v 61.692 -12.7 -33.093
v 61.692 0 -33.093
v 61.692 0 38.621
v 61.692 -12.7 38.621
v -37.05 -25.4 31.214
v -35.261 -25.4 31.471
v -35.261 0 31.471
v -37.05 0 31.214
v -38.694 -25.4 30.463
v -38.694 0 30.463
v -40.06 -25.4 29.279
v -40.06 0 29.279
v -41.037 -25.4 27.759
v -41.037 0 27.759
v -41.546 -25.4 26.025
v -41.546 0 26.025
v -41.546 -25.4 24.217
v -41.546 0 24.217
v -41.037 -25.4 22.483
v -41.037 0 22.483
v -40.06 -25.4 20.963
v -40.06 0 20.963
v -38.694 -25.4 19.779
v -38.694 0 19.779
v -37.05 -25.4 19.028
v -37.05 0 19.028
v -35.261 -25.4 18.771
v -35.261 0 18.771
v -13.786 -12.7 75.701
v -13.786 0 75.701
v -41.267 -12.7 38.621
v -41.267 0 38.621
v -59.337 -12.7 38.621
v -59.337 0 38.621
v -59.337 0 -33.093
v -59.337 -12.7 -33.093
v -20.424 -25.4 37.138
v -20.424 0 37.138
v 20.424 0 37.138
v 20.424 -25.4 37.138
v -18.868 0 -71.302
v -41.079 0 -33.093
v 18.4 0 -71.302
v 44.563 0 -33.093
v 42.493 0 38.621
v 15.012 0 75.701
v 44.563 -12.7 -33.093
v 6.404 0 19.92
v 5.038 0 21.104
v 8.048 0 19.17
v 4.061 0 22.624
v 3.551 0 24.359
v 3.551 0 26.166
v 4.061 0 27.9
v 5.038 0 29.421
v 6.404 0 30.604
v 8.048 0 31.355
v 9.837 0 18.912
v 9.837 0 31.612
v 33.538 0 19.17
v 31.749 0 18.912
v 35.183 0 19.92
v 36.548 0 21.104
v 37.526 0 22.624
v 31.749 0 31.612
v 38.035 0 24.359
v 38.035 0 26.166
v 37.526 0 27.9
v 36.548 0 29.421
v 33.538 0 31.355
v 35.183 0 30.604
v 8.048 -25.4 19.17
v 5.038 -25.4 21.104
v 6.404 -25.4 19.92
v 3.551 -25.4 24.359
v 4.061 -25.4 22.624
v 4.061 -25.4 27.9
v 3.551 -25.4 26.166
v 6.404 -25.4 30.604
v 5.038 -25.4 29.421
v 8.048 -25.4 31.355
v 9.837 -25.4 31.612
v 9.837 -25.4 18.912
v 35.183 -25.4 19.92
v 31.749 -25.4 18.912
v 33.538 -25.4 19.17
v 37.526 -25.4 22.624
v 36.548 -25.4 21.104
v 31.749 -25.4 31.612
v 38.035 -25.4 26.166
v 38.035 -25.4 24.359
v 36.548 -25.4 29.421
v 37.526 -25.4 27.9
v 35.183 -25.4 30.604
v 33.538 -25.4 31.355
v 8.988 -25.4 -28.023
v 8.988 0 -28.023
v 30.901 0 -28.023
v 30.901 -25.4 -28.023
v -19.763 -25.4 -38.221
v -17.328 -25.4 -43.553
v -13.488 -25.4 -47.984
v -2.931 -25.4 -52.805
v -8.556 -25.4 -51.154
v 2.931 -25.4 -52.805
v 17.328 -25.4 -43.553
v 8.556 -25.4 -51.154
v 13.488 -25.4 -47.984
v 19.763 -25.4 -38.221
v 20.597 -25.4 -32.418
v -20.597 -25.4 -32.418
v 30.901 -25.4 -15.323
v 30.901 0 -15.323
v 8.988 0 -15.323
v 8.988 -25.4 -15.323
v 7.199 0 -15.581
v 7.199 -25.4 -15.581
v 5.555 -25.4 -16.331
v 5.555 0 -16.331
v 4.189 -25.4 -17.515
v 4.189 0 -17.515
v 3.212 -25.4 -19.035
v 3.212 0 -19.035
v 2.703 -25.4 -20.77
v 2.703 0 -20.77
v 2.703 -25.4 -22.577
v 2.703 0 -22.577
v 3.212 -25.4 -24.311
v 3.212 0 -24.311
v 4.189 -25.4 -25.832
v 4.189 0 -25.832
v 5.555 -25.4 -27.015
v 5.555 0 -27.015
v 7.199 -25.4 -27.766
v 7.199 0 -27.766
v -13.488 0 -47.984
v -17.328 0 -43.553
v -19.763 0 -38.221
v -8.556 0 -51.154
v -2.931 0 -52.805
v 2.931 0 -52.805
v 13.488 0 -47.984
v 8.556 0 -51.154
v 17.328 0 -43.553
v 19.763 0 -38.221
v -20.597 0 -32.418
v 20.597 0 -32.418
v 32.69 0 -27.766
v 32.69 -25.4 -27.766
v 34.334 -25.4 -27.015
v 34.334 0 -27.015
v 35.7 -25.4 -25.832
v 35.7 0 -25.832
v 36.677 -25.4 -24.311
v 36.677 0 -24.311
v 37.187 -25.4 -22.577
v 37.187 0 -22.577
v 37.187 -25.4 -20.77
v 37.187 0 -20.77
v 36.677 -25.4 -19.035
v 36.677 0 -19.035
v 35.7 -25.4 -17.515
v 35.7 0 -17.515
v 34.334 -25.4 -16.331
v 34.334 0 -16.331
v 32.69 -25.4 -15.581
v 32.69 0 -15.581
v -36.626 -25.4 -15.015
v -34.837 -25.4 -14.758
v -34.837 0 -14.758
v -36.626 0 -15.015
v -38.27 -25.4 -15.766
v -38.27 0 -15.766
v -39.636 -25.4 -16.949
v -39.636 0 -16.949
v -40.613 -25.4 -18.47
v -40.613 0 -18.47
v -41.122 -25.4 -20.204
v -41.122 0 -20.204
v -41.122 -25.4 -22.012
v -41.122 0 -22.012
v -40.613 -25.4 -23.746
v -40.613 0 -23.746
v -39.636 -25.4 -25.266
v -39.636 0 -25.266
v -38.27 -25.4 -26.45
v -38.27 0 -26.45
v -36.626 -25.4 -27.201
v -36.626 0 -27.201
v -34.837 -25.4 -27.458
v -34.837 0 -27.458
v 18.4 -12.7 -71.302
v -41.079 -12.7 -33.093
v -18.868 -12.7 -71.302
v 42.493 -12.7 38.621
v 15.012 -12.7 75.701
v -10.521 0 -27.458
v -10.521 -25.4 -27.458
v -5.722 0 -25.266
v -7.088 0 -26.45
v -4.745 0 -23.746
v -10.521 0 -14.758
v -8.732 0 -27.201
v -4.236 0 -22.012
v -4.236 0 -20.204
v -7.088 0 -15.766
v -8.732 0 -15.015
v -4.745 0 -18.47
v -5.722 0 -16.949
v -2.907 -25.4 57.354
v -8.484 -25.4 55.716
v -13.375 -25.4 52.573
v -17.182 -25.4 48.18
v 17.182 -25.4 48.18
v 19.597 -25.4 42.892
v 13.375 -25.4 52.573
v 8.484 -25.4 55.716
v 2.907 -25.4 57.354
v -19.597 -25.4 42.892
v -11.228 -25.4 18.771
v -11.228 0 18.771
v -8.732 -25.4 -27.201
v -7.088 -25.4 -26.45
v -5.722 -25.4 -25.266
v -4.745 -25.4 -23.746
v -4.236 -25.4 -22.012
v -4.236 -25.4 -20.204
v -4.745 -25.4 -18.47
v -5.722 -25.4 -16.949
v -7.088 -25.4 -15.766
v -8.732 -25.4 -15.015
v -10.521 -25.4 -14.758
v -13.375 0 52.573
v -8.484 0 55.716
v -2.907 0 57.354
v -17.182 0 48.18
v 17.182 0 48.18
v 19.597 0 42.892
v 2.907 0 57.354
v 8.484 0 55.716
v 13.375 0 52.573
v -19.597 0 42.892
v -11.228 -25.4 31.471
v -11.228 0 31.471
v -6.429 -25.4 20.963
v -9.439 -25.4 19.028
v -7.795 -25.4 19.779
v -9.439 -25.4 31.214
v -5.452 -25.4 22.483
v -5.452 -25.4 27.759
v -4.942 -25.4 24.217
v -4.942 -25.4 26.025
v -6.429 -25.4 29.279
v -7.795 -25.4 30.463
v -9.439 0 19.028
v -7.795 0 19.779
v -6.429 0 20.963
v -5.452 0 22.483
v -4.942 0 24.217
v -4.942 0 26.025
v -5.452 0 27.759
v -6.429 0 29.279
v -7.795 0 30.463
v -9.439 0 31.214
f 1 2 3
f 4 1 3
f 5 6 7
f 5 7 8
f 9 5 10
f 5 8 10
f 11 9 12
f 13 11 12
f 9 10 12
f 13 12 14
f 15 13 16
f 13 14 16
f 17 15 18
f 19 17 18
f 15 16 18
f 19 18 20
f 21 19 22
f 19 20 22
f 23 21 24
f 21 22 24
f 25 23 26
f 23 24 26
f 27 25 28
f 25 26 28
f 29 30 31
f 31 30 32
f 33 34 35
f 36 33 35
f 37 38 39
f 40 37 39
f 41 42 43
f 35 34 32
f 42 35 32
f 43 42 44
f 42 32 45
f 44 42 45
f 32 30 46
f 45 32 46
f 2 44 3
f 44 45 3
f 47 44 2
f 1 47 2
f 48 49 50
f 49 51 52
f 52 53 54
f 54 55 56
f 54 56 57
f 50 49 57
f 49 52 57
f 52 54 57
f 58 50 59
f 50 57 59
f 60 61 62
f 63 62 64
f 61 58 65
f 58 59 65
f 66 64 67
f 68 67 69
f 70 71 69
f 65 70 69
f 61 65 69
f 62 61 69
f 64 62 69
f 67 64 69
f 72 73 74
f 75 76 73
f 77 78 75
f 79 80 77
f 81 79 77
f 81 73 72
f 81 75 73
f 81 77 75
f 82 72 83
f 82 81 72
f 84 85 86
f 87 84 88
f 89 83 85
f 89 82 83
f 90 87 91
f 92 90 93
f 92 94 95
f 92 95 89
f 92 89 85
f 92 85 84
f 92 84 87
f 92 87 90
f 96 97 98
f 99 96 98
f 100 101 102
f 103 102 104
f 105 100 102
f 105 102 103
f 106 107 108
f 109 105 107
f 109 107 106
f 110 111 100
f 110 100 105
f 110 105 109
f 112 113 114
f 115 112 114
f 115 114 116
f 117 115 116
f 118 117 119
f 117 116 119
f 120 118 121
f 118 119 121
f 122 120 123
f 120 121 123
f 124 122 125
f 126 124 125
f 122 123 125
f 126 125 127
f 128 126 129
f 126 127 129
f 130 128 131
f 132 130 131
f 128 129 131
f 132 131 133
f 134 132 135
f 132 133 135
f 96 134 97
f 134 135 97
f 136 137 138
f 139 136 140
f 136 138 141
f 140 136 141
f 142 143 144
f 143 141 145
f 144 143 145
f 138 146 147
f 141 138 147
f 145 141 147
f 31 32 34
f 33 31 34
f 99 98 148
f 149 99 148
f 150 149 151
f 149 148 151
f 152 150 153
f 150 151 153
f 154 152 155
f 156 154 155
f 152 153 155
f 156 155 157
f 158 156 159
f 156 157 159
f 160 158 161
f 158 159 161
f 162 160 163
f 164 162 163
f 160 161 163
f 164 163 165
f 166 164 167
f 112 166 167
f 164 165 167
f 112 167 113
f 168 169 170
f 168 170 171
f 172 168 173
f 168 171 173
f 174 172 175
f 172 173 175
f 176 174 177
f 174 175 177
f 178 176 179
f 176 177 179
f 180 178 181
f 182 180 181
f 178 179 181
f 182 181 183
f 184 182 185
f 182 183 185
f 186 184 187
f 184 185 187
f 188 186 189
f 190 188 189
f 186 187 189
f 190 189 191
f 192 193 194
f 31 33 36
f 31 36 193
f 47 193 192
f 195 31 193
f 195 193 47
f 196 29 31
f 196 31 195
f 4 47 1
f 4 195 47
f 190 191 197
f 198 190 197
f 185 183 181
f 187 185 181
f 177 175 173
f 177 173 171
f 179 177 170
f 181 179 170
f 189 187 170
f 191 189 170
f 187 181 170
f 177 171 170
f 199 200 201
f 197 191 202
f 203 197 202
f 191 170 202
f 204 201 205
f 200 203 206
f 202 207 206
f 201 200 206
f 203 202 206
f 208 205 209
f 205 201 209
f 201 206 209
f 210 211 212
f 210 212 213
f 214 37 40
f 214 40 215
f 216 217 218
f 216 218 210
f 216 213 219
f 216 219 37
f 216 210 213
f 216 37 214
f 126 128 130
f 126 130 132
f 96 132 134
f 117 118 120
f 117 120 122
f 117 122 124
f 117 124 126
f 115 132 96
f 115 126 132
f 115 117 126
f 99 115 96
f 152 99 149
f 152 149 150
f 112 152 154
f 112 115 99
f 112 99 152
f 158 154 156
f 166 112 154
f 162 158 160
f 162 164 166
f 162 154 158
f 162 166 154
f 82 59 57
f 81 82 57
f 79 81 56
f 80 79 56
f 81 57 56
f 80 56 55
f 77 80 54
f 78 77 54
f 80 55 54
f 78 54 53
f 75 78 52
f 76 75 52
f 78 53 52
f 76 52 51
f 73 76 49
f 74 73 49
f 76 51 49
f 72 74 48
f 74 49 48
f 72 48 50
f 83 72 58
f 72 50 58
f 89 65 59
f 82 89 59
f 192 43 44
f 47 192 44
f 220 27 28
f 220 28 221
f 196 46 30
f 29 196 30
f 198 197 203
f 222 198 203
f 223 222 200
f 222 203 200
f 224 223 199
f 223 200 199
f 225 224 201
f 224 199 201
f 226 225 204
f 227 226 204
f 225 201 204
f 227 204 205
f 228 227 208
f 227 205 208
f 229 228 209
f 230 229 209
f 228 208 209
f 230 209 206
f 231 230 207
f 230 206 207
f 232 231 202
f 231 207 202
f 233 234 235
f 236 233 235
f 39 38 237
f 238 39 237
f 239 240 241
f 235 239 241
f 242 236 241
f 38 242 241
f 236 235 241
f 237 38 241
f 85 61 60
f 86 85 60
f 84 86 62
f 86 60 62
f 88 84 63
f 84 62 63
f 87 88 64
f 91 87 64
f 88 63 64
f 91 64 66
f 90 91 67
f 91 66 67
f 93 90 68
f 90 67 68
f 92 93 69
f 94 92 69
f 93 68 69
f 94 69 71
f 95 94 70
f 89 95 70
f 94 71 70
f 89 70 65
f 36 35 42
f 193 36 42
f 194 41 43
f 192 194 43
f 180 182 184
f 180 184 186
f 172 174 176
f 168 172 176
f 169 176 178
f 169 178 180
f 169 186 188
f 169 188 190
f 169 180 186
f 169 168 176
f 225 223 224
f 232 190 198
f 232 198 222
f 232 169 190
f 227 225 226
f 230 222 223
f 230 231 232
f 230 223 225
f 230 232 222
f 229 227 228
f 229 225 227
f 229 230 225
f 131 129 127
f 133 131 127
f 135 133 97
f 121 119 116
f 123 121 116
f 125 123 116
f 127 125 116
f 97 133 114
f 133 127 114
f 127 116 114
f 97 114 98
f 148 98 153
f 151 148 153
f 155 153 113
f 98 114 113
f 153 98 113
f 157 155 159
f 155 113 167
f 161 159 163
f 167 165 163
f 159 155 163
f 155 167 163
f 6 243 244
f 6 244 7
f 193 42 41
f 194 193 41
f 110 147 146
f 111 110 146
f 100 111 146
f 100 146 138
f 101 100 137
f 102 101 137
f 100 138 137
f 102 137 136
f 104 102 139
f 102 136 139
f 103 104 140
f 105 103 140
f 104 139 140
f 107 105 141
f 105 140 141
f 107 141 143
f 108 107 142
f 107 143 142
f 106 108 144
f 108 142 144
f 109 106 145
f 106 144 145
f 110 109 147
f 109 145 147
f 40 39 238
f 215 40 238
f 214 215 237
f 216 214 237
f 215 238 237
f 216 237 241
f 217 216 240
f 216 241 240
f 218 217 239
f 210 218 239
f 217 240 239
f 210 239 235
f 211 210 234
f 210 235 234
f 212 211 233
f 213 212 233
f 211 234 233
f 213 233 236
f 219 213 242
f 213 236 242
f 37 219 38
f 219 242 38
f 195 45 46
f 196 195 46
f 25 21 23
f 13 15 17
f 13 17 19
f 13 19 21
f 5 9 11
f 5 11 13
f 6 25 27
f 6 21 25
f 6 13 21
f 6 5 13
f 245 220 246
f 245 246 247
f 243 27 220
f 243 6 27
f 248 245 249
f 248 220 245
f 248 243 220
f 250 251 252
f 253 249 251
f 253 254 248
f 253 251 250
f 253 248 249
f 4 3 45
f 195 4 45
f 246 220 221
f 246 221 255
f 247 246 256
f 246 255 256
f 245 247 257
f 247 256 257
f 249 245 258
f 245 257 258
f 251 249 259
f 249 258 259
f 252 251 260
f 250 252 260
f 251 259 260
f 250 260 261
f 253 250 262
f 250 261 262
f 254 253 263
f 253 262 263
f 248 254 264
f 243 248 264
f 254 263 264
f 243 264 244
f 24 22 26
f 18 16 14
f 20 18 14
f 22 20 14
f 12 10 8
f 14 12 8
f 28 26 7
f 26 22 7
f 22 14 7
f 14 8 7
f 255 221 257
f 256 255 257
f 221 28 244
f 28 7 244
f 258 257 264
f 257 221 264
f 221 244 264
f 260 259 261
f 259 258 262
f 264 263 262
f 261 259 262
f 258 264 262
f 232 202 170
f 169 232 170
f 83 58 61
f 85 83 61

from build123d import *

# Parameters (mm, degrees)
F1_DEPTH = 25.4
F3_DEPTH = 12.7


with BuildPart() as f1:
    # F0 (on Front) → F1 (new body)
    with BuildSketch(Plane.XZ):
        with BuildLine():
            ThreePointArc((-35.261057, 31.470921), (-41.611057, 25.120921), (-35.261057, 18.770921))
            Line((-35.261057, 18.770921), (-11.227757, 18.770921))
            ThreePointArc((-11.227757, 18.770921), (-4.877757, 25.120921), (-11.227757, 31.470921))
            Line((-11.227757, 31.470921), (-35.261057, 31.470921))
        make_face()
        with BuildLine():
            Line((-20.42393, 37.137575), (20.42393, 37.137575))
            ThreePointArc((20.42393, 37.137575), (0, 57.561506), (-20.42393, 37.137575))
        make_face()
        with BuildLine():
            ThreePointArc((31.749442, 18.912296), (38.099442, 25.262296), (31.749442, 31.612296))
            Line((31.749442, 31.612296), (9.836733, 31.612296))
            ThreePointArc((9.836733, 31.612296), (3.486733, 25.262296), (9.836733, 18.912296))
            Line((9.836733, 18.912296), (31.749442, 18.912296))
        make_face()
        with BuildLine():
            ThreePointArc((-34.83694, -14.757845), (-41.18694, -21.107845), (-34.83694, -27.457845))
            Line((-34.83694, -27.457845), (-10.52089, -27.457845))
            ThreePointArc((-10.52089, -27.457845), (-4.17089, -21.107845), (-10.52089, -14.757845))
            Line((-10.52089, -14.757845), (-34.83694, -14.757845))
        make_face()
        with BuildLine():
            Line((20.597451, -32.417633), (-20.597451, -32.417633))
            ThreePointArc((-20.597451, -32.417633), (0, -53.015084), (20.597451, -32.417633))
        make_face()
        with BuildLine():
            ThreePointArc((30.901209, -28.023329), (37.251209, -21.673329), (30.901209, -15.323329))
            Line((30.901209, -15.323329), (8.9885, -15.323329))
            ThreePointArc((8.9885, -15.323329), (2.6385, -21.673329), (8.9885, -28.023329))
            Line((8.9885, -28.023329), (30.901209, -28.023329))
        make_face()
    extrude(amount=F1_DEPTH)


with BuildPart() as f3:
    # F2 (on Front) → F3 (new body)
    with BuildSketch(Plane.XZ):
        Polygon((61.691672, -33.092782), (61.691672, 38.62071), (42.492777, 38.62071), (-41.267082, 38.62071), (-59.336632, 38.62071), (-59.336632, -33.092782), (-41.078858, -33.092782), (44.563249, -33.092782), align=None)
        Polygon((-41.267082, 38.62071), (42.492777, 38.62071), (15.012011, 75.700924), (-13.786316, 75.700924), align=None)
        Polygon((18.400058, -71.302339), (44.563249, -33.092782), (-41.078858, -33.092782), (-18.868379, -71.302339), align=None)
    extrude(amount=F3_DEPTH)


solid = Compound([f1.part, f3.part])
